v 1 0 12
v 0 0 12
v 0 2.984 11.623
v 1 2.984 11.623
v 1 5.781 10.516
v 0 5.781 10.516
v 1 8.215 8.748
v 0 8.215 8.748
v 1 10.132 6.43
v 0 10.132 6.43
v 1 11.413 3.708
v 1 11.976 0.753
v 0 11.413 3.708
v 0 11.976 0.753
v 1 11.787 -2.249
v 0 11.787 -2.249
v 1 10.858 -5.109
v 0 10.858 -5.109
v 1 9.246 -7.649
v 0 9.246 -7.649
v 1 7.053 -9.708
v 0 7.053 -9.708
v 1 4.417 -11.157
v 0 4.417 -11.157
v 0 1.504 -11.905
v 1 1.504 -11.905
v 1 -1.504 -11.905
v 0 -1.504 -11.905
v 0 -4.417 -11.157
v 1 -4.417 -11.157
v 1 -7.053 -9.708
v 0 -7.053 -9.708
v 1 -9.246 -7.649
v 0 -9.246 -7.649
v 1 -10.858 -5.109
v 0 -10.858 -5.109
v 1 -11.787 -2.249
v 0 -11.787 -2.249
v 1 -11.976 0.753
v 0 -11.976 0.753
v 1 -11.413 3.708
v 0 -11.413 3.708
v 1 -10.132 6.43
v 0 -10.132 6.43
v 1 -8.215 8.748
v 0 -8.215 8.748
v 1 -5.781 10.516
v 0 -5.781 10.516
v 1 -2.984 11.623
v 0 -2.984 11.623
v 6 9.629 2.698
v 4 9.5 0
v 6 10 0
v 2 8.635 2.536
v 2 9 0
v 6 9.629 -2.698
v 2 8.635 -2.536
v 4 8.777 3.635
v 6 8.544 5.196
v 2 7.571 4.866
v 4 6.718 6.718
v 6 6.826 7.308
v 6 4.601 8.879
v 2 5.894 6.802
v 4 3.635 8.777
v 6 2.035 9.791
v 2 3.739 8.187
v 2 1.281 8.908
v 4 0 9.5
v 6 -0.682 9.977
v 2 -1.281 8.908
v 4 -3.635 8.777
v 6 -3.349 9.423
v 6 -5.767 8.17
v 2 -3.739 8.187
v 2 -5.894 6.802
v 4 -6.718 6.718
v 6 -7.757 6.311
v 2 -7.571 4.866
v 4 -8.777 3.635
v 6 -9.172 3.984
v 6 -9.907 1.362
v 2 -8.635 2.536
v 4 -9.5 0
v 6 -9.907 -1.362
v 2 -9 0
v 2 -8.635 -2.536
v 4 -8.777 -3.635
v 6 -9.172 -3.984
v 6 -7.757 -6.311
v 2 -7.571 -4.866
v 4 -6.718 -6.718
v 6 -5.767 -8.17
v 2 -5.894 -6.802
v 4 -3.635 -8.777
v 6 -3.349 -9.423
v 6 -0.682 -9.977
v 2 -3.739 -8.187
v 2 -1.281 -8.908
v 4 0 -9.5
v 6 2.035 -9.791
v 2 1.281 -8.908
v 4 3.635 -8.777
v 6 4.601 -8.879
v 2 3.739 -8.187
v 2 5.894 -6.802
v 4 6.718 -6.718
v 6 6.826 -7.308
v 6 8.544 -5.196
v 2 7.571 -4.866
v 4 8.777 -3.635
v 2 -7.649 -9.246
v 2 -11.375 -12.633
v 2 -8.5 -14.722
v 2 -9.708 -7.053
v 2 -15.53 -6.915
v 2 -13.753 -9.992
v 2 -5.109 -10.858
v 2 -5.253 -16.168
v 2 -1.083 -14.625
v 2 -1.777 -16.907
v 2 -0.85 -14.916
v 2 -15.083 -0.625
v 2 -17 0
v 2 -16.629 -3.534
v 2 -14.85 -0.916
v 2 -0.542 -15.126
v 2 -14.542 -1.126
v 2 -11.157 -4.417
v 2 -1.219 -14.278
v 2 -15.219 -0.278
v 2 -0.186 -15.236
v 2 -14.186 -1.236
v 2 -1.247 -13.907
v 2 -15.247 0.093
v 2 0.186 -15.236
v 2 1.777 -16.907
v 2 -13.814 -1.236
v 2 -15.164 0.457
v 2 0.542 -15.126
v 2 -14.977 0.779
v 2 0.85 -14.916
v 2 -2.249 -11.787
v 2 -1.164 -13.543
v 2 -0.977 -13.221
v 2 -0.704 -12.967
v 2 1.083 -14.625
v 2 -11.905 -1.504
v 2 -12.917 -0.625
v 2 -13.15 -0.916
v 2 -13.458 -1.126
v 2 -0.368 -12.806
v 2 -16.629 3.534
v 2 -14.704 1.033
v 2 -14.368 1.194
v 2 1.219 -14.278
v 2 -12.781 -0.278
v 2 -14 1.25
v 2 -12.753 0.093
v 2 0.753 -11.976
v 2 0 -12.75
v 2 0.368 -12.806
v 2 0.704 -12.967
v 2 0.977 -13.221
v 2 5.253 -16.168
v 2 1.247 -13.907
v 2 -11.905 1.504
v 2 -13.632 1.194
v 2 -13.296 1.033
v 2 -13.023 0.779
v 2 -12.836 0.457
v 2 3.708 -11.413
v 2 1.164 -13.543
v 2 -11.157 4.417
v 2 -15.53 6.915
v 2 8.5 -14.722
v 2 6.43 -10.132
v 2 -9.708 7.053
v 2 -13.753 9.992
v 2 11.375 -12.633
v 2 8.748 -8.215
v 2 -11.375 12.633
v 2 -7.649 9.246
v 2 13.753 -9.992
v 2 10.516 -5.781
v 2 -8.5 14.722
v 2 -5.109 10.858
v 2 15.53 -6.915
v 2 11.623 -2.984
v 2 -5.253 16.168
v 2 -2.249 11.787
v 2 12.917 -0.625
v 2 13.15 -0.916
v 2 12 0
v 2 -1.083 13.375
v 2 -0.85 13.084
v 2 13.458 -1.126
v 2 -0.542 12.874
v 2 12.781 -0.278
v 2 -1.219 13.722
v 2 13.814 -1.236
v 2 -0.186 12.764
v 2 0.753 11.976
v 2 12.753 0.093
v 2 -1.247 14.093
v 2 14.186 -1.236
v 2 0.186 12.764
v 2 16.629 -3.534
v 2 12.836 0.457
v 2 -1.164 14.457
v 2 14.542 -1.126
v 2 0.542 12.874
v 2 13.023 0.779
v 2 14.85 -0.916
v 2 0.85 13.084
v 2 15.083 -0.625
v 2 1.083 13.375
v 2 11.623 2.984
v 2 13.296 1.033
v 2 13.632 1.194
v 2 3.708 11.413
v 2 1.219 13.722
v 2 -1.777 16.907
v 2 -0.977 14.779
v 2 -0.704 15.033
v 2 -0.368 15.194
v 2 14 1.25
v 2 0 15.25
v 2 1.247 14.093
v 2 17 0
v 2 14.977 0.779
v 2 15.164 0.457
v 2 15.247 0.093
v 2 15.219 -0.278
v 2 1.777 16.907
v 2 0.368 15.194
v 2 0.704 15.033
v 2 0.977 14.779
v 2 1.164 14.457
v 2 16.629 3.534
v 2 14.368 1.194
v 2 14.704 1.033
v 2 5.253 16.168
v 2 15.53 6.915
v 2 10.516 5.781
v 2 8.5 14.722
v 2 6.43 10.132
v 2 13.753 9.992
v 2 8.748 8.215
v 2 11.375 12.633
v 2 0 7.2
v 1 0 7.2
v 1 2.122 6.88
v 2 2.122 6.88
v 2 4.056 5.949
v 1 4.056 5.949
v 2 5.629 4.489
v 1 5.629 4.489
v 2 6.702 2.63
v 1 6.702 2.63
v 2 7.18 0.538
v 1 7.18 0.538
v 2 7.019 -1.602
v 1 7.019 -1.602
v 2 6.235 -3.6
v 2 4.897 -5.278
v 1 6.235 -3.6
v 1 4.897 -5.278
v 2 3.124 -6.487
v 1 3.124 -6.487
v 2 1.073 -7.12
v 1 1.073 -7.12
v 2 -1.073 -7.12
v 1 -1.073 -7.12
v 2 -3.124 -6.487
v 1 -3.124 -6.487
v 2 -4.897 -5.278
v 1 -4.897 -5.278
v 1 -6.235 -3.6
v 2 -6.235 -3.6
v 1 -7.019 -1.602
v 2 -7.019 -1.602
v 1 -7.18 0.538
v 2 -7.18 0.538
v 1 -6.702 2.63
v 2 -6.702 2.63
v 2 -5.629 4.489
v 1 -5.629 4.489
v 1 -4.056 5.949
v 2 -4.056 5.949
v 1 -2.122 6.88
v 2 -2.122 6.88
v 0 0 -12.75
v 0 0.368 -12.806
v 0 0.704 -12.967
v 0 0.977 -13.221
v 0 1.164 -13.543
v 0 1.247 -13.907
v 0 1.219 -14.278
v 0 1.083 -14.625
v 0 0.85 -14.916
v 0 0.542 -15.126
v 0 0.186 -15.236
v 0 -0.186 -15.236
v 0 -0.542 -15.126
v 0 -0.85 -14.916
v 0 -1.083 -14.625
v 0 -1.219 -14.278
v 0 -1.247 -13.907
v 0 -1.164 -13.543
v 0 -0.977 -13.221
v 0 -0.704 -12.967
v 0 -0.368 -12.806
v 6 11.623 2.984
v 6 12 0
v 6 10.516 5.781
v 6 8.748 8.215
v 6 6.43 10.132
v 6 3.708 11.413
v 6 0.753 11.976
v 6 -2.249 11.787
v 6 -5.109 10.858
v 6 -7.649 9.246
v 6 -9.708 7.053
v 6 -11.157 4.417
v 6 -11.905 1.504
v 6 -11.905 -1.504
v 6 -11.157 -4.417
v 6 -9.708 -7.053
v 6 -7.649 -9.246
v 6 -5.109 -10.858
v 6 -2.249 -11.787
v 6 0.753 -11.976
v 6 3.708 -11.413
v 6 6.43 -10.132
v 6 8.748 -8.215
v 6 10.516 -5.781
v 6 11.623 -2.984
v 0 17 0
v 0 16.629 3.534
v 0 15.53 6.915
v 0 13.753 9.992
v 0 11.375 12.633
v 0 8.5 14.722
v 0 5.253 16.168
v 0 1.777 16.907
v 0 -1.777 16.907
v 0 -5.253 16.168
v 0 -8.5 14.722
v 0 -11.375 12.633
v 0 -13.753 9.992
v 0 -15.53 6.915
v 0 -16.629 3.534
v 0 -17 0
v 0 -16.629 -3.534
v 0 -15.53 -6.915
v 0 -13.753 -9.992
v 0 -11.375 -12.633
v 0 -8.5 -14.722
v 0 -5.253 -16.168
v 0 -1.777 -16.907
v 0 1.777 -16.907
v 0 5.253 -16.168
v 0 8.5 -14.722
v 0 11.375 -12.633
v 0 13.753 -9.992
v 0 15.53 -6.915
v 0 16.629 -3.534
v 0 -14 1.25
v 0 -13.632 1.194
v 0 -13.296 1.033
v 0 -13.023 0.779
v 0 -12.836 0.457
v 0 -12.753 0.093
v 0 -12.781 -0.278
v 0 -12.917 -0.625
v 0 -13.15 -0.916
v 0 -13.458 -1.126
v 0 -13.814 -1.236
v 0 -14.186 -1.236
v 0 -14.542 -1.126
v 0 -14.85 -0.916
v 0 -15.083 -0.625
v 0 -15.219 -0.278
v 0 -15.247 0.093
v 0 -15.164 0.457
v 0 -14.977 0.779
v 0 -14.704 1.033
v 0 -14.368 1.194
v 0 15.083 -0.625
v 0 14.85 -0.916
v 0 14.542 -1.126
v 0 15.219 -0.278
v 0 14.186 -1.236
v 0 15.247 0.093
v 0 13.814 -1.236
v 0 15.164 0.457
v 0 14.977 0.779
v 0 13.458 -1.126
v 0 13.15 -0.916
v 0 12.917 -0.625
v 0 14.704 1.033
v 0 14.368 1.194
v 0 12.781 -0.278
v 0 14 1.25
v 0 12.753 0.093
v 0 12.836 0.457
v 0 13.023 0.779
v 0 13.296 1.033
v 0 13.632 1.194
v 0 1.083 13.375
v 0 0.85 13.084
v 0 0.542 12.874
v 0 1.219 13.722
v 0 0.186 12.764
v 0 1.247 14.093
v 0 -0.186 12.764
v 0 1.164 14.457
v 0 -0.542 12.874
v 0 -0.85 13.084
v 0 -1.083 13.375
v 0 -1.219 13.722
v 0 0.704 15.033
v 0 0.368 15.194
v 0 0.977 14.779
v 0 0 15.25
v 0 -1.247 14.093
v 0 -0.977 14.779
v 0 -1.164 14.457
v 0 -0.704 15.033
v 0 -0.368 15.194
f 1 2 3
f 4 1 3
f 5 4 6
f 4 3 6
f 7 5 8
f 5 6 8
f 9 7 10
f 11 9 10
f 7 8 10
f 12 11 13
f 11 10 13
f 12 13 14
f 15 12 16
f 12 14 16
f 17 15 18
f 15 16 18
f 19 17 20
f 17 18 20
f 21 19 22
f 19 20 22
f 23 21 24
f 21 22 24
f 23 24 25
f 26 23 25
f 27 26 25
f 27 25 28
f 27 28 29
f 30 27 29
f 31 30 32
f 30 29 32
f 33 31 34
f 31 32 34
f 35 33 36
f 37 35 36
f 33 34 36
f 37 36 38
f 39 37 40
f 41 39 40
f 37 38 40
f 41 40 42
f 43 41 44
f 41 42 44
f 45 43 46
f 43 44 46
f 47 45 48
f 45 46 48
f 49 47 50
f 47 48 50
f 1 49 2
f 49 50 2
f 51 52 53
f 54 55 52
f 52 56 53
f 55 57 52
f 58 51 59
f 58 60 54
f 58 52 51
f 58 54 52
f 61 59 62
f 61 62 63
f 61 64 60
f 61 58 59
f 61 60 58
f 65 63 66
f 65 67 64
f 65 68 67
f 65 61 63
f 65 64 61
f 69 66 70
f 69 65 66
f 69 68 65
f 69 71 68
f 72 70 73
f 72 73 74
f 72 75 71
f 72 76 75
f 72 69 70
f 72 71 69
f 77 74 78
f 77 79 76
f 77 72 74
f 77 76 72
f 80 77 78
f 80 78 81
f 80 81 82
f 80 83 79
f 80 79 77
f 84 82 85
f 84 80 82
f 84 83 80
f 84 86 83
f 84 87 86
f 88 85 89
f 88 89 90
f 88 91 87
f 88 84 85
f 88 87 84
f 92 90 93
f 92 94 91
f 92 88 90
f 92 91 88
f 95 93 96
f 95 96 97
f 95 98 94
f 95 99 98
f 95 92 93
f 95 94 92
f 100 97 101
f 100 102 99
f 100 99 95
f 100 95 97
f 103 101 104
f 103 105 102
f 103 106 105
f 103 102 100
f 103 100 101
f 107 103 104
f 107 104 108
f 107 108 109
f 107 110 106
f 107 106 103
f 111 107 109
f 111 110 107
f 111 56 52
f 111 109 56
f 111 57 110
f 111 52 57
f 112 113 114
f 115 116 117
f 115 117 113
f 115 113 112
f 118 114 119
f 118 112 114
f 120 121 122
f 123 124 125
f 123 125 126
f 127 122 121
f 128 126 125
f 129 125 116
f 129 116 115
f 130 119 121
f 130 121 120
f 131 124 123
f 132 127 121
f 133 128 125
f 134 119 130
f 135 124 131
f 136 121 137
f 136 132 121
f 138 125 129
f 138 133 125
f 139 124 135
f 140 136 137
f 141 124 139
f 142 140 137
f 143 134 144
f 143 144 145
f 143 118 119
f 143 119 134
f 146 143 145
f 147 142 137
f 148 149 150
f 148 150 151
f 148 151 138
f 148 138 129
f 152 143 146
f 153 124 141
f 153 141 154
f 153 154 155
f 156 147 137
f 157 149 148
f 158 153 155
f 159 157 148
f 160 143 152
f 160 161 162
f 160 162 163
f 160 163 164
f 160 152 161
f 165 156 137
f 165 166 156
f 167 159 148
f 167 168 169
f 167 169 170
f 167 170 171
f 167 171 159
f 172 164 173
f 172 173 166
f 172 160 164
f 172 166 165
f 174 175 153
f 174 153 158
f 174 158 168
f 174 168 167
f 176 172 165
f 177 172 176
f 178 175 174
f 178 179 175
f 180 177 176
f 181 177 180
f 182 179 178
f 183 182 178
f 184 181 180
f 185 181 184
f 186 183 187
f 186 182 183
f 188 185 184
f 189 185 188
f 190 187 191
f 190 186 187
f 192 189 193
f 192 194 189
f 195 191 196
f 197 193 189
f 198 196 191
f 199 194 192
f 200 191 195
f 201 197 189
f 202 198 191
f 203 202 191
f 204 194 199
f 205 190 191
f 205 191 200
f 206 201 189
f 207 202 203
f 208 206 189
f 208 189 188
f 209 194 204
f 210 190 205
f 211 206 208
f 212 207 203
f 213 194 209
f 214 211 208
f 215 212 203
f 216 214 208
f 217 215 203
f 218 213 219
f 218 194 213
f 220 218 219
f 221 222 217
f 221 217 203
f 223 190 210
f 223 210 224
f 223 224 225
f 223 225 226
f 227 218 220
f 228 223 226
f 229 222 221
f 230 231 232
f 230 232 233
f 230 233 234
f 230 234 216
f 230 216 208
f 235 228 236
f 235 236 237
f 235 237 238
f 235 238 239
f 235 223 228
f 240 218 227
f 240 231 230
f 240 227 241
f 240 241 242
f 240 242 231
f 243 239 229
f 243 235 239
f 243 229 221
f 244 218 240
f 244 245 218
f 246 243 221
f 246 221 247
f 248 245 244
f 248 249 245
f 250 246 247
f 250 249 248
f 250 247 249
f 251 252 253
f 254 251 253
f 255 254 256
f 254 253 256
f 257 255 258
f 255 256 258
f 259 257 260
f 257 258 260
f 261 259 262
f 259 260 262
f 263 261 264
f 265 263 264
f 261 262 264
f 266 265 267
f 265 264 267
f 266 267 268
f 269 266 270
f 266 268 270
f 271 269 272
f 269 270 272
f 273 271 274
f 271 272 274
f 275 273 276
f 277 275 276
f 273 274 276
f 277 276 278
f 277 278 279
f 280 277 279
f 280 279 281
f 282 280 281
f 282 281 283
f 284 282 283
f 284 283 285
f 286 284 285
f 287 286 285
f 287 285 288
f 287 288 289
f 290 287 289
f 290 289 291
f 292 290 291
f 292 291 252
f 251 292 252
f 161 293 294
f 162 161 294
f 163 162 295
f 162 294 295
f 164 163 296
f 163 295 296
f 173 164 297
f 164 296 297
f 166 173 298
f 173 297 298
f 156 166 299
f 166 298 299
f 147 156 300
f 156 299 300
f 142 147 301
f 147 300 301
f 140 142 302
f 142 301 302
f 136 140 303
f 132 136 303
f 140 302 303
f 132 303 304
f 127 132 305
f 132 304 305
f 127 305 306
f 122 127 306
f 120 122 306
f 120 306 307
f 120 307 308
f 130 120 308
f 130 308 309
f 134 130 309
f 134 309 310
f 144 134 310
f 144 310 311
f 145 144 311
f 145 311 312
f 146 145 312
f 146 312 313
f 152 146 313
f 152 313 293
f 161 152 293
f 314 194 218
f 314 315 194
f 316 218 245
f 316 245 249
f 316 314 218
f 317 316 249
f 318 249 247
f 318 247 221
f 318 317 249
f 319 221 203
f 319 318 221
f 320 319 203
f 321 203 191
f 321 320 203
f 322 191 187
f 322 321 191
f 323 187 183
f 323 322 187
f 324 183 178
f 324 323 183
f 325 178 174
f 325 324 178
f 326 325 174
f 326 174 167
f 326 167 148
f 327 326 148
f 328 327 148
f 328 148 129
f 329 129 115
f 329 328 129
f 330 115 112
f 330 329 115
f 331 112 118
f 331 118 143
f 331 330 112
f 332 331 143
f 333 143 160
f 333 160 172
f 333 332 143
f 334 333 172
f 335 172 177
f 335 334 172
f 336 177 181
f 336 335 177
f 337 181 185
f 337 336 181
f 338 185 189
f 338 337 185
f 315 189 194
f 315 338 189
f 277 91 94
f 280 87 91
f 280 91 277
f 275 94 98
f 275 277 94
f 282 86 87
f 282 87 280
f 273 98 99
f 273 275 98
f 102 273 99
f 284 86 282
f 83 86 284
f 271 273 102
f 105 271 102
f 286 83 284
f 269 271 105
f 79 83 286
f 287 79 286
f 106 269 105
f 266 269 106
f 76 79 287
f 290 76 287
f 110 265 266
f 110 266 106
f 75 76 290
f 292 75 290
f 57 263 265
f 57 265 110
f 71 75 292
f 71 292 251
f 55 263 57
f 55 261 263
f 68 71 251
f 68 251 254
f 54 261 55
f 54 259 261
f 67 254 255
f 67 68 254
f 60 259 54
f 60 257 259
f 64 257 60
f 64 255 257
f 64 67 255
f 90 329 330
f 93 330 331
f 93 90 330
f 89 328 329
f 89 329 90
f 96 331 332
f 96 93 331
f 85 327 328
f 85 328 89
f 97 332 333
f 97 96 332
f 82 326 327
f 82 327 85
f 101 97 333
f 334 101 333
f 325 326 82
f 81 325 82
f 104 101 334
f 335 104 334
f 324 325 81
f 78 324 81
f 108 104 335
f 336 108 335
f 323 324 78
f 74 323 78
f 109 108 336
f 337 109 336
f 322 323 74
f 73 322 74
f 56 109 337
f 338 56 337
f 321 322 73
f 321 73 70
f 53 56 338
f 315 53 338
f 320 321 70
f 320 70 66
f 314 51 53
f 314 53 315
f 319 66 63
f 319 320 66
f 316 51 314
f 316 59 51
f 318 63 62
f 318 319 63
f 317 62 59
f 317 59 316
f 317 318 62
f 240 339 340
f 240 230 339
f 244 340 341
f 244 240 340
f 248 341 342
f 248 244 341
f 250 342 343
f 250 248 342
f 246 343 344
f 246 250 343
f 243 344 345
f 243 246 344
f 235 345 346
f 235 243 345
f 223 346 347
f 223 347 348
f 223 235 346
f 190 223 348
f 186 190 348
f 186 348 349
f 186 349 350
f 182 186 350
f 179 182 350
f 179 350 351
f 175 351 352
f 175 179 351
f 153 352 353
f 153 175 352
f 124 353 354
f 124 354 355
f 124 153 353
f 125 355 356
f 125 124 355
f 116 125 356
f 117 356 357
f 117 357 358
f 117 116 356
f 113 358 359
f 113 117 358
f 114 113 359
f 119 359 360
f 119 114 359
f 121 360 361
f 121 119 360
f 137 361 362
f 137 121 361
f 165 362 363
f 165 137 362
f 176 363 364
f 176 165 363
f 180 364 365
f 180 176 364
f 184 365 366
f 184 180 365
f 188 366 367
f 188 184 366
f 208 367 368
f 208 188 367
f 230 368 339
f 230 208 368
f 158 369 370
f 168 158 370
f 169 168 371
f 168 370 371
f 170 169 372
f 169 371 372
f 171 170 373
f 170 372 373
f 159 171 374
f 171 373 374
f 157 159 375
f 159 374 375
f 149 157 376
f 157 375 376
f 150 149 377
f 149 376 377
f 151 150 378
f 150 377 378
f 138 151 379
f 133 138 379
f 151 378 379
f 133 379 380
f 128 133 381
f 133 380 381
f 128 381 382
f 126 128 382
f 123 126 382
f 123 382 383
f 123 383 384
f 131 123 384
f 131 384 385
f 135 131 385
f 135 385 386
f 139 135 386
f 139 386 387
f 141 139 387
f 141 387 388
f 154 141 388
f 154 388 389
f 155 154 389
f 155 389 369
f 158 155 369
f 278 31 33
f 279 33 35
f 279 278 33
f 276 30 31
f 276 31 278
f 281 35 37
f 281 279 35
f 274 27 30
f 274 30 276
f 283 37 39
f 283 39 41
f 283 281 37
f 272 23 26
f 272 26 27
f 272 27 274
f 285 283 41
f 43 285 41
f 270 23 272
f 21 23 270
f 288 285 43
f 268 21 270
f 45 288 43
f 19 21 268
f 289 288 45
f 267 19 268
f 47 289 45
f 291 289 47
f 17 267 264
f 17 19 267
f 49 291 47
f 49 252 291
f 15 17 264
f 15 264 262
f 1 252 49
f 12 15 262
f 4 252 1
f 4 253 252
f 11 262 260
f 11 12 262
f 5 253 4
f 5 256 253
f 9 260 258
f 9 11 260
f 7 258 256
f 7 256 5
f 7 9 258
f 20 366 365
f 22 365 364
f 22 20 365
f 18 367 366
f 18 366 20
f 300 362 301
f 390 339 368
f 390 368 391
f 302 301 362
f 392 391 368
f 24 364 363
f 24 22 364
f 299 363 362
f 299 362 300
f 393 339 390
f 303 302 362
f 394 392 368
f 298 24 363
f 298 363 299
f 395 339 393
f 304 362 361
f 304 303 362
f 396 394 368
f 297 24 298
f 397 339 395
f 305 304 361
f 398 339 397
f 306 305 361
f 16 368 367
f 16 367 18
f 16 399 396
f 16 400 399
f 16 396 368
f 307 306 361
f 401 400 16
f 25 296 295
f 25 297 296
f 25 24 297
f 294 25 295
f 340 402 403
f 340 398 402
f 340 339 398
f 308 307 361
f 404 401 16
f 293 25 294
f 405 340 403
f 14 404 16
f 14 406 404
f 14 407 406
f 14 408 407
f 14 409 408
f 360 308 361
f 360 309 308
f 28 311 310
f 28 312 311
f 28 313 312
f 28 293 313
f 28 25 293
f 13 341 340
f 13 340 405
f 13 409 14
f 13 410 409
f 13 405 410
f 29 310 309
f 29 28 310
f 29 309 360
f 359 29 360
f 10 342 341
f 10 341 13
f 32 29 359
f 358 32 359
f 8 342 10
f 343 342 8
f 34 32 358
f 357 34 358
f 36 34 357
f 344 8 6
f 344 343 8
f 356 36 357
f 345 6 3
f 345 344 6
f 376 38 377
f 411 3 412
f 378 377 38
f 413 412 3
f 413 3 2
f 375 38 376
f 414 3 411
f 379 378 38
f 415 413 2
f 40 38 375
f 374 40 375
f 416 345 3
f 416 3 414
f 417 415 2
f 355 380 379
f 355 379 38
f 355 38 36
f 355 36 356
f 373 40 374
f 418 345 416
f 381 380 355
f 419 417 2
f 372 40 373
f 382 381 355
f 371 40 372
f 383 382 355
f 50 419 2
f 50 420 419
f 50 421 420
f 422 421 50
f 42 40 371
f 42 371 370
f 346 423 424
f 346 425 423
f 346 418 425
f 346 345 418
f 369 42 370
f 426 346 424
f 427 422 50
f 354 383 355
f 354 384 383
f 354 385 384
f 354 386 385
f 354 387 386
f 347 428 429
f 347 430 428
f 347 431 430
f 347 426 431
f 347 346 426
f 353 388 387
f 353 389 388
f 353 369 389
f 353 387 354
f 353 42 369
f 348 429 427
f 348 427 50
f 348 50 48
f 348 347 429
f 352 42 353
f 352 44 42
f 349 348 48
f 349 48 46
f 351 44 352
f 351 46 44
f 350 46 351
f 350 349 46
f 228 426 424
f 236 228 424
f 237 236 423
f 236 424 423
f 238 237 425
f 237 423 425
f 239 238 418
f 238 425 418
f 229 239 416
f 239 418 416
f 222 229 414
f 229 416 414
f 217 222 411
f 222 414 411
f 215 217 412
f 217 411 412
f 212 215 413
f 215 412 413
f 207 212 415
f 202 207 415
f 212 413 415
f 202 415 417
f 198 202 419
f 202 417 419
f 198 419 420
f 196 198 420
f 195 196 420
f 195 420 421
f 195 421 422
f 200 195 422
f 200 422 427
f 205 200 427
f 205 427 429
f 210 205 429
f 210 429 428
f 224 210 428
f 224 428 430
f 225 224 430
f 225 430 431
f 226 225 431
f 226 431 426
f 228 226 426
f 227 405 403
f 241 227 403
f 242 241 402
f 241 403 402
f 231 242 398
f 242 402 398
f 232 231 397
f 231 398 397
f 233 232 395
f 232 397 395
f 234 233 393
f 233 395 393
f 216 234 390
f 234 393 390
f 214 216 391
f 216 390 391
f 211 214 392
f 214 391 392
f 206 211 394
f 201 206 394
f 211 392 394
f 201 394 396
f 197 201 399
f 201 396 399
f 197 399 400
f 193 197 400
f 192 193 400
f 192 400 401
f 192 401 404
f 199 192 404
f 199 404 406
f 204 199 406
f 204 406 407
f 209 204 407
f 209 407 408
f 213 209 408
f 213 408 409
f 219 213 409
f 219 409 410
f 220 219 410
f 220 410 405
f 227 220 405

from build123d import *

# Parameters (mm, degrees)
CUT_EXTRUDE3_REACH = 8
SKETCH4_R          = 1.25
SKETCH2_R          = 12
CUT_EXTRUDE4_DEPTH = 1
CUT_EXTRUDE5_REACH = 7
SKETCH5_R          = 7.2


with BuildPart() as part:
    # Sketch1 → Revolve1 (revolve)
    with BuildSketch(Plane.XY):
        Polygon((0, 0), (0, 17), (2, 17), (2, 12), (6, 12), (6, 10), (2, 9), (2, 0), align=None)
    revolve(axis=Axis((0, 0, 0), (1, 0, 0)))

    # Sketch4 → Cut-Extrude3 (cut, up to next)
    with BuildSketch(Plane.ZY, mode=Mode.PRIVATE) as cut_extrude3_sk1:
        with Locations((0, 14)):
            Circle(SKETCH4_R)
    cut_extrude3_tool1 = extrude(cut_extrude3_sk1.sketch, amount=-CUT_EXTRUDE3_REACH, mode=Mode.PRIVATE) & part.part
    add(cut_extrude3_tool1.solids().sort_by_distance((0, 14, 0))[0], mode=Mode.SUBTRACT)
    # Sketch4 → Cut-Extrude3 (cut, up to next)
    with BuildSketch(Plane.ZY, mode=Mode.PRIVATE) as cut_extrude3_sk2:
        with Locations((14, 0)):
            Circle(SKETCH4_R)
    cut_extrude3_tool2 = extrude(cut_extrude3_sk2.sketch, amount=-CUT_EXTRUDE3_REACH, mode=Mode.PRIVATE) & part.part
    add(cut_extrude3_tool2.solids().sort_by_distance((0, 0, 14))[0], mode=Mode.SUBTRACT)
    # Sketch4 → Cut-Extrude3 (cut, up to next)
    with BuildSketch(Plane.ZY, mode=Mode.PRIVATE) as cut_extrude3_sk3:
        with Locations((0, -14)):
            Circle(SKETCH4_R)
    cut_extrude3_tool3 = extrude(cut_extrude3_sk3.sketch, amount=-CUT_EXTRUDE3_REACH, mode=Mode.PRIVATE) & part.part
    add(cut_extrude3_tool3.solids().sort_by_distance((0, -14, 0))[0], mode=Mode.SUBTRACT)
    # Sketch4 → Cut-Extrude3 (cut, up to next)
    with BuildSketch(Plane.ZY, mode=Mode.PRIVATE) as cut_extrude3_sk4:
        with Locations((-14, 0)):
            Circle(SKETCH4_R)
    cut_extrude3_tool4 = extrude(cut_extrude3_sk4.sketch, amount=-CUT_EXTRUDE3_REACH, mode=Mode.PRIVATE) & part.part
    add(cut_extrude3_tool4.solids().sort_by_distance((0, 0, -14))[0], mode=Mode.SUBTRACT)

    # Sketch2 → Cut-Extrude4 (cut)
    with BuildSketch(Plane.ZY):
        Circle(SKETCH2_R)
    extrude(amount=-CUT_EXTRUDE4_DEPTH, mode=Mode.SUBTRACT)

    # Sketch5 → Cut-Extrude5 (cut, up to next)
    with BuildSketch(Plane.ZY.offset(-1), mode=Mode.PRIVATE) as cut_extrude5_sk1:
        Circle(SKETCH5_R)
    cut_extrude5_tool1 = extrude(cut_extrude5_sk1.sketch, amount=-CUT_EXTRUDE5_REACH, mode=Mode.PRIVATE) & part.part
    add(cut_extrude5_tool1.solids().sort_by_distance((1, 0, 0))[0], mode=Mode.SUBTRACT)


solid = part.part
